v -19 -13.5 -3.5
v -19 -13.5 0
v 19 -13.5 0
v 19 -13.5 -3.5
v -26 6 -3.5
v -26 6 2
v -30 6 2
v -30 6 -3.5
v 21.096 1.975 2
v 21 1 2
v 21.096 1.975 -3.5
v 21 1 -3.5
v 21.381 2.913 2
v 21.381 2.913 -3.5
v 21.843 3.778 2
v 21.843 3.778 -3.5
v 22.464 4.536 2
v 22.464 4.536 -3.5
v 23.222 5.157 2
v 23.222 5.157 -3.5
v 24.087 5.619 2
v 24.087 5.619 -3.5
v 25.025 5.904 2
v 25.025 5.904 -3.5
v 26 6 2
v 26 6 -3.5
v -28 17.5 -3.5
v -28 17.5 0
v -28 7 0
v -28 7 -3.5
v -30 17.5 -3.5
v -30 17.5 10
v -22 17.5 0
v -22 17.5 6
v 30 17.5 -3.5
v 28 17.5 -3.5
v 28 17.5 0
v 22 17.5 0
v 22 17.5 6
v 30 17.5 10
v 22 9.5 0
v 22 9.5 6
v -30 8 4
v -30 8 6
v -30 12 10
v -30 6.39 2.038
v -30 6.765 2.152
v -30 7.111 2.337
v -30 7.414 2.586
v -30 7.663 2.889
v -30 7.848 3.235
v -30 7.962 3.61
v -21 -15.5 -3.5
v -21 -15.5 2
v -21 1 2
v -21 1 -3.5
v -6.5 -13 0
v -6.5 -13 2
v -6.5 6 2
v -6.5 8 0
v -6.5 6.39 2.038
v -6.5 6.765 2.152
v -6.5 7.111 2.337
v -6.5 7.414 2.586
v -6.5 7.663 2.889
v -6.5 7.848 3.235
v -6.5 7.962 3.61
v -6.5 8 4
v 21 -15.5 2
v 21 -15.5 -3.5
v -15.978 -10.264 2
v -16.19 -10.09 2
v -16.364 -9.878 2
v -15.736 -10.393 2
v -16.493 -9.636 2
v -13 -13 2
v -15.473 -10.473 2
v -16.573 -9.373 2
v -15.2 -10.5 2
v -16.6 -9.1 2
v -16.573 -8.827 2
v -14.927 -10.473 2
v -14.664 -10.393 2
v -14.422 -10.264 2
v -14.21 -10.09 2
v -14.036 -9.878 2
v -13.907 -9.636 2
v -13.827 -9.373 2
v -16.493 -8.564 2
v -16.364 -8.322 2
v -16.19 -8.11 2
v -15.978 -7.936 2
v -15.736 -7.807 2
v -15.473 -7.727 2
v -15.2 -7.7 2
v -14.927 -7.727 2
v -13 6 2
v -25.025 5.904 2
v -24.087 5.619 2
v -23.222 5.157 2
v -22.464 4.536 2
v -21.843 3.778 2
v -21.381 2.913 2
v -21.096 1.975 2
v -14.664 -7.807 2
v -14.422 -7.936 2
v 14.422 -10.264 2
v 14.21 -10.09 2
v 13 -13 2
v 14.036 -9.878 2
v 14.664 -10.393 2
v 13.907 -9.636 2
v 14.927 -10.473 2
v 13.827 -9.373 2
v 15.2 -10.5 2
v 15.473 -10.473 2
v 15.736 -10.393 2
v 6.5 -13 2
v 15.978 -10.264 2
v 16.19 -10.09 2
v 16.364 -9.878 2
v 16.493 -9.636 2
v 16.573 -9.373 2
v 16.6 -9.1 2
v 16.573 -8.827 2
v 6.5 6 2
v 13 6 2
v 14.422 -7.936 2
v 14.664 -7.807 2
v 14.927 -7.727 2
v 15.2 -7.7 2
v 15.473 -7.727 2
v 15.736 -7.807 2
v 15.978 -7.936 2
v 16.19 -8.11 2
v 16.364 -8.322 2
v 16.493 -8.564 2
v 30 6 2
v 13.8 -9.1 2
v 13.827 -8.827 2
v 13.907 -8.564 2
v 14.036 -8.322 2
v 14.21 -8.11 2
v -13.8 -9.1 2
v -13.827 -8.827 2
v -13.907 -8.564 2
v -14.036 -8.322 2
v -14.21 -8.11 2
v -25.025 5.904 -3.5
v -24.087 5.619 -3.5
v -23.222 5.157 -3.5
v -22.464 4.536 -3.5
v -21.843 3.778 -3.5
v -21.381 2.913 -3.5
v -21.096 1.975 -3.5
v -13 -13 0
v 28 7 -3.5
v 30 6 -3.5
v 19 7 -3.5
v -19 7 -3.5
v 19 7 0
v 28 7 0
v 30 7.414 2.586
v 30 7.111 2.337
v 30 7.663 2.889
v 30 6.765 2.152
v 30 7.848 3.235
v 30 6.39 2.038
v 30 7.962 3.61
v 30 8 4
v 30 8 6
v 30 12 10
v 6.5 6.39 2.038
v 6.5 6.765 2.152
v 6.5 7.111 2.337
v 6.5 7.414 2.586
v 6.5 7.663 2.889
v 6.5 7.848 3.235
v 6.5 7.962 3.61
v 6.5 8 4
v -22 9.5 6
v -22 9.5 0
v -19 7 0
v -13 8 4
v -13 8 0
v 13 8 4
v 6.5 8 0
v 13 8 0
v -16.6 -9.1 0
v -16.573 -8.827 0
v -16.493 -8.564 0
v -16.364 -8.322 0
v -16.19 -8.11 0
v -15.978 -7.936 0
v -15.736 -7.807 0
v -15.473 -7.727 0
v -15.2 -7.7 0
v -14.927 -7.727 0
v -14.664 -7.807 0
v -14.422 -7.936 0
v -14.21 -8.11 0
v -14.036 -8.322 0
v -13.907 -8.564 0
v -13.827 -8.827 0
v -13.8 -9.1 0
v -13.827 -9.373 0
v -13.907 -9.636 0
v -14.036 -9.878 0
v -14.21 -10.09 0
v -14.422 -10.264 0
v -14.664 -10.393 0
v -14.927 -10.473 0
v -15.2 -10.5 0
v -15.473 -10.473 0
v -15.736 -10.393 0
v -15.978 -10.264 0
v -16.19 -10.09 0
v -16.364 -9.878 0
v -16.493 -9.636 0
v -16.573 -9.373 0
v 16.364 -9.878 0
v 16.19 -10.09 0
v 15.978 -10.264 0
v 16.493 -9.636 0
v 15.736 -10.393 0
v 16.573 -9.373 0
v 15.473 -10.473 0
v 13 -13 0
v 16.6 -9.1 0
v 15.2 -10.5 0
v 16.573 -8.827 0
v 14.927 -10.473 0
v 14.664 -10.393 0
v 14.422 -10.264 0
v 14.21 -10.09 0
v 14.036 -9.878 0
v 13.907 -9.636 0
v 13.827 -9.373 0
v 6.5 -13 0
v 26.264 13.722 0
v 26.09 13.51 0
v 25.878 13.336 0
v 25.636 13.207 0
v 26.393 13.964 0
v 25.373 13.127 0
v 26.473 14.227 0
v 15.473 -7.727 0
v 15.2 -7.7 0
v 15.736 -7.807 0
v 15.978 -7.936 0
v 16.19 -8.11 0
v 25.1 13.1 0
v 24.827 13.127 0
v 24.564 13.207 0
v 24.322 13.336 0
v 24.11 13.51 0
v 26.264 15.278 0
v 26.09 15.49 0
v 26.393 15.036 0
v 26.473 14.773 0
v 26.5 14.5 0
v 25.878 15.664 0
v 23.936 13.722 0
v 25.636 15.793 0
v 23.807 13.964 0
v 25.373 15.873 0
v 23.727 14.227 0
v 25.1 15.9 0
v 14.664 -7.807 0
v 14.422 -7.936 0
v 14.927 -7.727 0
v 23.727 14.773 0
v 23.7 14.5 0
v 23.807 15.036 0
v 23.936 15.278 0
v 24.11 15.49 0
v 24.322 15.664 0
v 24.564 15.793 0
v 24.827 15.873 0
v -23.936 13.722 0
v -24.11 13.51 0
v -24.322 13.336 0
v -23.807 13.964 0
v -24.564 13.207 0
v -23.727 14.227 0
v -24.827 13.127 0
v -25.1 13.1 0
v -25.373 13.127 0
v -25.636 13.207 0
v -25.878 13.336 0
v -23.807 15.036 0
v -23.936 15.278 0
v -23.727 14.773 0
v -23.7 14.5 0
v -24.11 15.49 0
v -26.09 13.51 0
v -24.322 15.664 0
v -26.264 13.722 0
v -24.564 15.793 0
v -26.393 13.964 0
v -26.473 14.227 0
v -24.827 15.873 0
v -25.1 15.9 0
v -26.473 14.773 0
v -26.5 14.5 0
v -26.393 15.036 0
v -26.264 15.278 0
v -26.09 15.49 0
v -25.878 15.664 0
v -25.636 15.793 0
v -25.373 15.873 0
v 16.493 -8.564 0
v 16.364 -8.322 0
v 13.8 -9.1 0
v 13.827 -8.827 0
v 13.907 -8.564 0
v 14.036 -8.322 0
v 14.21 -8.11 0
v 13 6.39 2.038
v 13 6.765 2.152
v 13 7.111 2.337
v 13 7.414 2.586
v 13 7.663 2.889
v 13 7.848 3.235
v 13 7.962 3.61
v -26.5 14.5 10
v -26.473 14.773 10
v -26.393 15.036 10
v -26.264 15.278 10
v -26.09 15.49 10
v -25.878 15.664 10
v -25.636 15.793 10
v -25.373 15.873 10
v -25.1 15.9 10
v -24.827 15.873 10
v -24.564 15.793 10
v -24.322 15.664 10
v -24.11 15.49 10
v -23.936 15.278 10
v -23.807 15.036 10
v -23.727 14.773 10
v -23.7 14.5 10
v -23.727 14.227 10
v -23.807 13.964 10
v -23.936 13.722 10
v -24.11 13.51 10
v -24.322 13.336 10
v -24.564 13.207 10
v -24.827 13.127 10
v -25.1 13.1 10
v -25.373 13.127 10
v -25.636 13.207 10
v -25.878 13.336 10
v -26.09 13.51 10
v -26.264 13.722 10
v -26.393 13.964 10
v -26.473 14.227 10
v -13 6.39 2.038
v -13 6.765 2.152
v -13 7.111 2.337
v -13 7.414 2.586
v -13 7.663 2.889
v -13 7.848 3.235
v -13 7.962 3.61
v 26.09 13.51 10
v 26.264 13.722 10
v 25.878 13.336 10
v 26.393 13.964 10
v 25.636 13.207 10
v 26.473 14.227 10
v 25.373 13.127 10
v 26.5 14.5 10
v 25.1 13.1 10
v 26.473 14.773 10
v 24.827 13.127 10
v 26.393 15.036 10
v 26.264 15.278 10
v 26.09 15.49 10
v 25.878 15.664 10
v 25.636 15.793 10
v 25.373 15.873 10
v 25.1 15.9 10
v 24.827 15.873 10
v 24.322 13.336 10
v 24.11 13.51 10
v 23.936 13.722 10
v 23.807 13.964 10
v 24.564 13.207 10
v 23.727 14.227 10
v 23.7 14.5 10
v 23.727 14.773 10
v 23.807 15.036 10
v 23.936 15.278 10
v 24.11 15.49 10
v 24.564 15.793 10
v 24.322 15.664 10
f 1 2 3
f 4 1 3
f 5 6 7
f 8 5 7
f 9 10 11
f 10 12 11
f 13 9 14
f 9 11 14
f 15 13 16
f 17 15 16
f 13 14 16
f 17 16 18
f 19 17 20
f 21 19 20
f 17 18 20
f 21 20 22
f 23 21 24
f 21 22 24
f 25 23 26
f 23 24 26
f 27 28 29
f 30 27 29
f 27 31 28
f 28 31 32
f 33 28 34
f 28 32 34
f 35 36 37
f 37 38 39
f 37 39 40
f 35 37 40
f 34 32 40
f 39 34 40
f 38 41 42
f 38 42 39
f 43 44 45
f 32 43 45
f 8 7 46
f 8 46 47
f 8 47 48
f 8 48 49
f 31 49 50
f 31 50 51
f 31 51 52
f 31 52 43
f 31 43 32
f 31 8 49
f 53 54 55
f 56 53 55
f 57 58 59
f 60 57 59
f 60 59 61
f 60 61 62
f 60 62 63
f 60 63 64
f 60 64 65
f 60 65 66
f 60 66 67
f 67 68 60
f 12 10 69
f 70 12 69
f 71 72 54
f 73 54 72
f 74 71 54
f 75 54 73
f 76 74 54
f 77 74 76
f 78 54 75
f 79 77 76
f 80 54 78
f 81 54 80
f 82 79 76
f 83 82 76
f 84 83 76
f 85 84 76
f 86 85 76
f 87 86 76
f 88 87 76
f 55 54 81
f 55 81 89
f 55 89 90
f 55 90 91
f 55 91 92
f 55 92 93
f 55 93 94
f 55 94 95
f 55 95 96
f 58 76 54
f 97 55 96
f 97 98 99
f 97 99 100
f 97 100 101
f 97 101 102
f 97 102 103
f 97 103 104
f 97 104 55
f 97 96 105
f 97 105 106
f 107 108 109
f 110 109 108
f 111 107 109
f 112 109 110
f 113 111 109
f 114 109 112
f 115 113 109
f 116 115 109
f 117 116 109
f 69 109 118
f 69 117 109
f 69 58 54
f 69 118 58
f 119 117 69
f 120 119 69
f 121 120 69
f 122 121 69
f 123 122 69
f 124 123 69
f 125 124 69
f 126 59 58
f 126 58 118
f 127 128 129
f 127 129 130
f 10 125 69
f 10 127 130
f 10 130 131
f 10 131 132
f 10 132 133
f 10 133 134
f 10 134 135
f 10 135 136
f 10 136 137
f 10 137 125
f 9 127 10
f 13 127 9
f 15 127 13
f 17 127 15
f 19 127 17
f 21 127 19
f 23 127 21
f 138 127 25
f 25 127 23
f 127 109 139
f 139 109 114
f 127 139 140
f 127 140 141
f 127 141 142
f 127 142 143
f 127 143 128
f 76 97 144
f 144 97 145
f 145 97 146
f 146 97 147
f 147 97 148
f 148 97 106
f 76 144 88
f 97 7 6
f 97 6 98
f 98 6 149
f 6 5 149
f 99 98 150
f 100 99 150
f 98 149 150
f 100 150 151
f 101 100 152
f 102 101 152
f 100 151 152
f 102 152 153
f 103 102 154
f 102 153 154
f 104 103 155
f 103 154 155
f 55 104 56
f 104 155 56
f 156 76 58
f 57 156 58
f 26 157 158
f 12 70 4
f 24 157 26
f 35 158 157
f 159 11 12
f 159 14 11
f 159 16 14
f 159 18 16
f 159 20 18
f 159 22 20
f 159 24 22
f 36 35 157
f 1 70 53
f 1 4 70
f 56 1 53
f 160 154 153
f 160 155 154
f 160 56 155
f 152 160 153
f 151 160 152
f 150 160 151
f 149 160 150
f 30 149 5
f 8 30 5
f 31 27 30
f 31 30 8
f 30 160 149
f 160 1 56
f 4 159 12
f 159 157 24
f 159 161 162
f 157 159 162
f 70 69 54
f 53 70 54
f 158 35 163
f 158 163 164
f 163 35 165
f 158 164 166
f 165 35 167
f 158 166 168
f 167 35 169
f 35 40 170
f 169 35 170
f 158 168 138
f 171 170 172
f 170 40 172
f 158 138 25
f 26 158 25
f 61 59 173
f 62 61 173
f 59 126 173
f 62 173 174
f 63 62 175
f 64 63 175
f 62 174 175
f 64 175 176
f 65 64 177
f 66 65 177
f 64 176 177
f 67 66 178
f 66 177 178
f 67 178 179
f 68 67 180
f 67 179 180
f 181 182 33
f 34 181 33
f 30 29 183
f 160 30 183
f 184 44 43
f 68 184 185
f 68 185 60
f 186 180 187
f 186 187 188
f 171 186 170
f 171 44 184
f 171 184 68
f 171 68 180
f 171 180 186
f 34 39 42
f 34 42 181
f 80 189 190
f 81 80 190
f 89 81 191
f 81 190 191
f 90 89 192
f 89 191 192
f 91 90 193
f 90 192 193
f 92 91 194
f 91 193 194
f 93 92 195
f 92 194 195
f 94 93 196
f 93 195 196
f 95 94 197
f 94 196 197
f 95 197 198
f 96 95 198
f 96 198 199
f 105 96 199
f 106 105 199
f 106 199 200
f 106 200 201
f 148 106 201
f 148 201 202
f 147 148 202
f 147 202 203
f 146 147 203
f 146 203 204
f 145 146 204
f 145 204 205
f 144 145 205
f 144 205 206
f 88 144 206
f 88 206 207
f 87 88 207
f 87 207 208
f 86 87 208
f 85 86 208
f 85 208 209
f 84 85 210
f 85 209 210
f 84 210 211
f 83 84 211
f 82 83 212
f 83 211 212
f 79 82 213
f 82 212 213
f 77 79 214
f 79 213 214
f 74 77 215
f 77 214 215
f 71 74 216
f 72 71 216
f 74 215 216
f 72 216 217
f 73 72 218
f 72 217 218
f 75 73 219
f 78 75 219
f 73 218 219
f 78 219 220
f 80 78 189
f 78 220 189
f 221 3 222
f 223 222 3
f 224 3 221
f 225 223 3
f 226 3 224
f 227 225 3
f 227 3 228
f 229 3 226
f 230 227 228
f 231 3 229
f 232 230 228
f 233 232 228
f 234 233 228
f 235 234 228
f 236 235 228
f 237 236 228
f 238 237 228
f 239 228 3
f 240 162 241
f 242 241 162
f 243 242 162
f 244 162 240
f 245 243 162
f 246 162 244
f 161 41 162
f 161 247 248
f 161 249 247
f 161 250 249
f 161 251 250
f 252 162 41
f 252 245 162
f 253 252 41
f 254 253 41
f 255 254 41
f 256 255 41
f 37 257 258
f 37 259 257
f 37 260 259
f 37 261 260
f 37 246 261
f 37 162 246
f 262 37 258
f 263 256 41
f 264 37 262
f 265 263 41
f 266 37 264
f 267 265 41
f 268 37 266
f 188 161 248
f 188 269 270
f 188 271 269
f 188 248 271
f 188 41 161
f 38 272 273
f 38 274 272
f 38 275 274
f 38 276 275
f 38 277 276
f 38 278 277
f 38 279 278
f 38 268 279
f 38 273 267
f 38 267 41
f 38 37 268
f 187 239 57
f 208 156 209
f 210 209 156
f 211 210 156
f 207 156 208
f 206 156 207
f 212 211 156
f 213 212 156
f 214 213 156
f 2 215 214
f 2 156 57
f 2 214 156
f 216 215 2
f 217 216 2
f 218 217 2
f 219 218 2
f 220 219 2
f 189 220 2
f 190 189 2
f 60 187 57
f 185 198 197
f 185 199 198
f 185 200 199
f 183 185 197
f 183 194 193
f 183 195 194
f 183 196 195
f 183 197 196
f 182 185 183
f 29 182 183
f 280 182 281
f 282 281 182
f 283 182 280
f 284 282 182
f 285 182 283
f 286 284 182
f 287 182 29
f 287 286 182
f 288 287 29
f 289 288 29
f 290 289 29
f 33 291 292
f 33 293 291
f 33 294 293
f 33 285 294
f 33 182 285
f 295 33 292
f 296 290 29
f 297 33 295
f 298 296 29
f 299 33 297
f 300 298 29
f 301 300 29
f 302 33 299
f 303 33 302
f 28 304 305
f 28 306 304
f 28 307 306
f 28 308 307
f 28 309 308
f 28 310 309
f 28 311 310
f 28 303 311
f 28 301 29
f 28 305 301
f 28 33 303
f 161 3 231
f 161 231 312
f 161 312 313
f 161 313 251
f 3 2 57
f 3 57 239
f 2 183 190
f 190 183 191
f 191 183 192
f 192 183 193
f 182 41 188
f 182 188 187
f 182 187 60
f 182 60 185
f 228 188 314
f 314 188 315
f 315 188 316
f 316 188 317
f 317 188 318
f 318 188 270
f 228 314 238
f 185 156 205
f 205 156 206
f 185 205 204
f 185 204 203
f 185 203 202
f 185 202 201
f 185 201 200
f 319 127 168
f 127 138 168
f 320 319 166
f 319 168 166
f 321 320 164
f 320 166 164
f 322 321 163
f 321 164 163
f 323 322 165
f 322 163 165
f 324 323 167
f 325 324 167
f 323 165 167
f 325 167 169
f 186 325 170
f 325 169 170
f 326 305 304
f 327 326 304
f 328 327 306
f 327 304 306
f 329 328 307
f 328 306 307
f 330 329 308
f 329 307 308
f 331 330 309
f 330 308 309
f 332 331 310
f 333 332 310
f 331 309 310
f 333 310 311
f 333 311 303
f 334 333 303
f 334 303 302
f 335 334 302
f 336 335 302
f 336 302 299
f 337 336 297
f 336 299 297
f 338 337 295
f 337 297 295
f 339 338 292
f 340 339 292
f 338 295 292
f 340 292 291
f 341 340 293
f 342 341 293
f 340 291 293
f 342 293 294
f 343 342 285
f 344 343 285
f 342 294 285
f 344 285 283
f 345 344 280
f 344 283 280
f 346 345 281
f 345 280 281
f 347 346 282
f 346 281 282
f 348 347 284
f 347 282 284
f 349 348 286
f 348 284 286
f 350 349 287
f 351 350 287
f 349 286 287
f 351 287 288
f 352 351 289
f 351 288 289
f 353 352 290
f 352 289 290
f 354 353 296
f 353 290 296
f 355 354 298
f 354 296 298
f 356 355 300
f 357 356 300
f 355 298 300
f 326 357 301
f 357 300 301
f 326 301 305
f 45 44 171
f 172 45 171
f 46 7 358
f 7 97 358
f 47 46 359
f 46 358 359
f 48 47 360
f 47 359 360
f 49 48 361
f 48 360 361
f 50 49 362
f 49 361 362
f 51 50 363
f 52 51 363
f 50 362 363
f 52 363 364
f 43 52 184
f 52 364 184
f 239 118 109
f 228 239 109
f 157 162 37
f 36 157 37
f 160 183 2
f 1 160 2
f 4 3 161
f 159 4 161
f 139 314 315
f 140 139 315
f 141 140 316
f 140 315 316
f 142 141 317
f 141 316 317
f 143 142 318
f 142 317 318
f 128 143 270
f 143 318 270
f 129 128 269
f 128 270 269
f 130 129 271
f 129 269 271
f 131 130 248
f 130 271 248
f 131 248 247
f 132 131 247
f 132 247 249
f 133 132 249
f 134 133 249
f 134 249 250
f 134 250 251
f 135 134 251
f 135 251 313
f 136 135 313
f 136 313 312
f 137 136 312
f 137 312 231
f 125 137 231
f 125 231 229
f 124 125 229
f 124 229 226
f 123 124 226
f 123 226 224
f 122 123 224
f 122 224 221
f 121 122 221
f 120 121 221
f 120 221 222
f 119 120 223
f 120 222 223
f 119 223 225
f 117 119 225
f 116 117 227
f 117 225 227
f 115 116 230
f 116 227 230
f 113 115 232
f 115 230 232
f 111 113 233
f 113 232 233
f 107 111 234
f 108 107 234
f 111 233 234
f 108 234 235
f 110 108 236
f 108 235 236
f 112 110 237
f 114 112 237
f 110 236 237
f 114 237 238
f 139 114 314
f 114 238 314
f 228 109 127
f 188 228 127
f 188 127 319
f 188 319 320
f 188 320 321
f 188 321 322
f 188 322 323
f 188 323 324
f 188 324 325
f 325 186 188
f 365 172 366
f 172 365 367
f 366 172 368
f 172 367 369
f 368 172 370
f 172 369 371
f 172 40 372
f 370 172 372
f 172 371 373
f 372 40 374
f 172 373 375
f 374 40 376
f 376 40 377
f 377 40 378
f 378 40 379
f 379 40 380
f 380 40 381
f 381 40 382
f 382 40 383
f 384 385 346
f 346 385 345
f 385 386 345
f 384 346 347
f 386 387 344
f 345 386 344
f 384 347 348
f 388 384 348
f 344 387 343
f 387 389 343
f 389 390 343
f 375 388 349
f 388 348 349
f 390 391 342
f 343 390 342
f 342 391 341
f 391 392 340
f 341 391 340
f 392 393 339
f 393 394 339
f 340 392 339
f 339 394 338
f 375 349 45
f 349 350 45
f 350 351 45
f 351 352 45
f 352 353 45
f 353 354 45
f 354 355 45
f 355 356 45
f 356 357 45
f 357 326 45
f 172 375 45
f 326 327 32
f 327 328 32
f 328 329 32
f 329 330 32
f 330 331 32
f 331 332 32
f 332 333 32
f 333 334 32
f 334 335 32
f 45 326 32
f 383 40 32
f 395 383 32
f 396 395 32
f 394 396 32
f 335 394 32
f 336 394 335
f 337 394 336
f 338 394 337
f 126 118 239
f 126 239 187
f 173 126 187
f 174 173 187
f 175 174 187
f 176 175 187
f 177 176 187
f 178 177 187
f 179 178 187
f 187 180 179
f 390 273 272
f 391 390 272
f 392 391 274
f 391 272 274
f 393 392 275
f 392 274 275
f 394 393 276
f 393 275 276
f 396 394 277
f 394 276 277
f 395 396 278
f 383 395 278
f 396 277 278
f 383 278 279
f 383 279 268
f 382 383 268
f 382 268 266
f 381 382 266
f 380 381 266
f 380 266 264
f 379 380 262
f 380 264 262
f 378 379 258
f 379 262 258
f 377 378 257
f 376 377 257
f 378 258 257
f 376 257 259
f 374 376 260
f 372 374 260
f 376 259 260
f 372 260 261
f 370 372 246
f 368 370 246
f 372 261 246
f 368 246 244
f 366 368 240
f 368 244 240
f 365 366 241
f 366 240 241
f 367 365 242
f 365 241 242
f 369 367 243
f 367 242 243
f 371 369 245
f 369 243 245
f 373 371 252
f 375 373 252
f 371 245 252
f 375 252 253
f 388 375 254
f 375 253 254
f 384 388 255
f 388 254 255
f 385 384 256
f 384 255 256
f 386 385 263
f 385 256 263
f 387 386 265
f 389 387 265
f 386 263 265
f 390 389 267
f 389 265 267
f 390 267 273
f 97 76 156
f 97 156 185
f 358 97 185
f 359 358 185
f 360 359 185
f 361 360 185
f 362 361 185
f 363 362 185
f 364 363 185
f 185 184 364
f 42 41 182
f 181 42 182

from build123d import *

# Parameters (mm, degrees)
SKETCH_1_W                 = 42
SKETCH_1_H                 = 35
EXTRUDE_1_DEPTH            = 10
SKETCH_2_W                 = 6.5
SKETCH_2_H                 = 21
CUT_EXTRUDE_1_DEPTH        = 10
SKETCH_5_W                 = 9
SKETCH_5_H                 = 11.5
EXTRUDE_2_DEPTH            = 10
SKETCH_6_R                 = 1.4
CUT_EXTRUDE_4_DEPTH        = 10
SKETCH_3_W                 = 44
SKETCH_3_H                 = 8
CUT_EXTRUDE_2_DEPTH        = 6
CUT_EXTRUDE_1_2_DEPTH      = 37.142080737
CUT_EXTRUDE_1_2_DEPTH_BACK = 10
SKETCH_8_W                 = 59.417014287
SKETCH_8_H                 = 10
EXTRUDE_3_DEPTH            = 3.5
SKETCH_12_W                = 60
SKETCH_12_H                = 23.5
CUT_EXTRUDE_5_DEPTH        = 8
FILLET_1_R                 = 5
FILLET_3_R                 = 2
CHAMFER_1_SIZE             = 4


with BuildPart() as part:
    # 草图1 → 凸台-拉伸1 (new body)
    with BuildSketch(Plane.XY):
        Rectangle(SKETCH_1_W, SKETCH_1_H)
    extrude(amount=EXTRUDE_1_DEPTH)

    # 草图2 → Cut-Extrude 1 (cut)
    with BuildSketch(Plane.XY.offset(10)):
        with Locations((-9.75, -2.5)):
            Rectangle(SKETCH_2_W, SKETCH_2_H)
        with Locations((9.75, -2.5)):
            Rectangle(SKETCH_2_W, SKETCH_2_H)
    extrude(amount=-CUT_EXTRUDE_1_DEPTH, mode=Mode.SUBTRACT)

    # 草图5 → 凸台-拉伸2 (add)
    with BuildSketch(Plane(origin=(0, 0, 0), x_dir=(-1, 0, 0), z_dir=(0, 0, -1))):
        with Locations((-25.5, 11.75)):
            Rectangle(SKETCH_5_W, SKETCH_5_H)
        with Locations((25.5, 11.75)):
            Rectangle(SKETCH_5_W, SKETCH_5_H)
    extrude(amount=-EXTRUDE_2_DEPTH)

    # 草图6 → 切除-拉伸4 (cut)
    with BuildSketch(Plane(origin=(0, 0, 0), x_dir=(-1, 0, 0), z_dir=(0, 0, -1))):
        with Locations((-25.1, 14.5)):
            Circle(SKETCH_6_R)
        with Locations((25.1, 14.5)):
            Circle(SKETCH_6_R)
        with Locations((-15.2, -9.1)):
            Circle(SKETCH_6_R)
        with Locations((15.2, -9.1)):
            Circle(SKETCH_6_R)
    extrude(amount=-CUT_EXTRUDE_4_DEPTH, mode=Mode.SUBTRACT)

    # 草图3 → 切除-拉伸2 (cut)
    with BuildSketch(Plane(origin=(0, 0, 0), x_dir=(-1, 0, 0), z_dir=(0, 0, -1))):
        with Locations((0, 13.5)):
            Rectangle(SKETCH_3_W, SKETCH_3_H)
    extrude(amount=-CUT_EXTRUDE_2_DEPTH, mode=Mode.SUBTRACT)

    # 草图8 → Cut-Extrude 1 2 (cut, two sides: drawn at the far end of the back side and taken through both)
    with BuildSketch(Plane.XY.offset(10).offset(-CUT_EXTRUDE_1_2_DEPTH_BACK)):
        with Locations((3.029489766, -20.5)):
            Rectangle(SKETCH_8_W, SKETCH_8_H)
    extrude(amount=CUT_EXTRUDE_1_2_DEPTH + CUT_EXTRUDE_1_2_DEPTH_BACK, mode=Mode.SUBTRACT)

    # 草图10 → 凸台-拉伸3 (add)
    with BuildSketch(Plane(origin=(0, 0, 0), x_dir=(-1, 0, 0), z_dir=(0, 0, -1))):
        Polygon((-28, 17.5), (-30, 17.5), (-30, 6), (-21, 6), (-21, -15.5), (0, -15.5), (0, -13.5), (-19, -13.5), (-19, 7), (-28, 7), align=None)
        Polygon((0, -13.5), (0, -15.5), (21, -15.5), (21, 6), (30, 6), (30, 17.5), (28, 17.5), (28, 7), (19, 7), (19, -13.5), align=None)
    extrude(amount=EXTRUDE_3_DEPTH)

    # 草图12 → 切除-拉伸5 (cut)
    with BuildSketch(Plane.XY.offset(10)):
        with Locations((0, -3.75)):
            Rectangle(SKETCH_12_W, SKETCH_12_H)
    extrude(amount=-CUT_EXTRUDE_5_DEPTH, mode=Mode.SUBTRACT)

    # 圆角1
    fillet_1_edges = [part.edges().sort_by_distance(p)[0] for p in [
        (-21, 6, -0.75),
        (21, 6, -0.75),
    ]]
    fillet(fillet_1_edges, radius=FILLET_1_R)

    # 圆角3
    fillet_3_edges = [part.edges().sort_by_distance(p)[0] for p in [
        (21.5, 8, 2),
        (-21.5, 8, 2),
        (0, 8, 2),
    ]]
    fillet(fillet_3_edges, radius=FILLET_3_R - 0.0001)  # a hair under: the kernel refuses the full size

    # 倒角1
    chamfer_1_edges = [part.edges().sort_by_distance(p)[0] for p in [
        (0, 8, 10),
    ]]
    chamfer(chamfer_1_edges, length=CHAMFER_1_SIZE)


solid = part.part
